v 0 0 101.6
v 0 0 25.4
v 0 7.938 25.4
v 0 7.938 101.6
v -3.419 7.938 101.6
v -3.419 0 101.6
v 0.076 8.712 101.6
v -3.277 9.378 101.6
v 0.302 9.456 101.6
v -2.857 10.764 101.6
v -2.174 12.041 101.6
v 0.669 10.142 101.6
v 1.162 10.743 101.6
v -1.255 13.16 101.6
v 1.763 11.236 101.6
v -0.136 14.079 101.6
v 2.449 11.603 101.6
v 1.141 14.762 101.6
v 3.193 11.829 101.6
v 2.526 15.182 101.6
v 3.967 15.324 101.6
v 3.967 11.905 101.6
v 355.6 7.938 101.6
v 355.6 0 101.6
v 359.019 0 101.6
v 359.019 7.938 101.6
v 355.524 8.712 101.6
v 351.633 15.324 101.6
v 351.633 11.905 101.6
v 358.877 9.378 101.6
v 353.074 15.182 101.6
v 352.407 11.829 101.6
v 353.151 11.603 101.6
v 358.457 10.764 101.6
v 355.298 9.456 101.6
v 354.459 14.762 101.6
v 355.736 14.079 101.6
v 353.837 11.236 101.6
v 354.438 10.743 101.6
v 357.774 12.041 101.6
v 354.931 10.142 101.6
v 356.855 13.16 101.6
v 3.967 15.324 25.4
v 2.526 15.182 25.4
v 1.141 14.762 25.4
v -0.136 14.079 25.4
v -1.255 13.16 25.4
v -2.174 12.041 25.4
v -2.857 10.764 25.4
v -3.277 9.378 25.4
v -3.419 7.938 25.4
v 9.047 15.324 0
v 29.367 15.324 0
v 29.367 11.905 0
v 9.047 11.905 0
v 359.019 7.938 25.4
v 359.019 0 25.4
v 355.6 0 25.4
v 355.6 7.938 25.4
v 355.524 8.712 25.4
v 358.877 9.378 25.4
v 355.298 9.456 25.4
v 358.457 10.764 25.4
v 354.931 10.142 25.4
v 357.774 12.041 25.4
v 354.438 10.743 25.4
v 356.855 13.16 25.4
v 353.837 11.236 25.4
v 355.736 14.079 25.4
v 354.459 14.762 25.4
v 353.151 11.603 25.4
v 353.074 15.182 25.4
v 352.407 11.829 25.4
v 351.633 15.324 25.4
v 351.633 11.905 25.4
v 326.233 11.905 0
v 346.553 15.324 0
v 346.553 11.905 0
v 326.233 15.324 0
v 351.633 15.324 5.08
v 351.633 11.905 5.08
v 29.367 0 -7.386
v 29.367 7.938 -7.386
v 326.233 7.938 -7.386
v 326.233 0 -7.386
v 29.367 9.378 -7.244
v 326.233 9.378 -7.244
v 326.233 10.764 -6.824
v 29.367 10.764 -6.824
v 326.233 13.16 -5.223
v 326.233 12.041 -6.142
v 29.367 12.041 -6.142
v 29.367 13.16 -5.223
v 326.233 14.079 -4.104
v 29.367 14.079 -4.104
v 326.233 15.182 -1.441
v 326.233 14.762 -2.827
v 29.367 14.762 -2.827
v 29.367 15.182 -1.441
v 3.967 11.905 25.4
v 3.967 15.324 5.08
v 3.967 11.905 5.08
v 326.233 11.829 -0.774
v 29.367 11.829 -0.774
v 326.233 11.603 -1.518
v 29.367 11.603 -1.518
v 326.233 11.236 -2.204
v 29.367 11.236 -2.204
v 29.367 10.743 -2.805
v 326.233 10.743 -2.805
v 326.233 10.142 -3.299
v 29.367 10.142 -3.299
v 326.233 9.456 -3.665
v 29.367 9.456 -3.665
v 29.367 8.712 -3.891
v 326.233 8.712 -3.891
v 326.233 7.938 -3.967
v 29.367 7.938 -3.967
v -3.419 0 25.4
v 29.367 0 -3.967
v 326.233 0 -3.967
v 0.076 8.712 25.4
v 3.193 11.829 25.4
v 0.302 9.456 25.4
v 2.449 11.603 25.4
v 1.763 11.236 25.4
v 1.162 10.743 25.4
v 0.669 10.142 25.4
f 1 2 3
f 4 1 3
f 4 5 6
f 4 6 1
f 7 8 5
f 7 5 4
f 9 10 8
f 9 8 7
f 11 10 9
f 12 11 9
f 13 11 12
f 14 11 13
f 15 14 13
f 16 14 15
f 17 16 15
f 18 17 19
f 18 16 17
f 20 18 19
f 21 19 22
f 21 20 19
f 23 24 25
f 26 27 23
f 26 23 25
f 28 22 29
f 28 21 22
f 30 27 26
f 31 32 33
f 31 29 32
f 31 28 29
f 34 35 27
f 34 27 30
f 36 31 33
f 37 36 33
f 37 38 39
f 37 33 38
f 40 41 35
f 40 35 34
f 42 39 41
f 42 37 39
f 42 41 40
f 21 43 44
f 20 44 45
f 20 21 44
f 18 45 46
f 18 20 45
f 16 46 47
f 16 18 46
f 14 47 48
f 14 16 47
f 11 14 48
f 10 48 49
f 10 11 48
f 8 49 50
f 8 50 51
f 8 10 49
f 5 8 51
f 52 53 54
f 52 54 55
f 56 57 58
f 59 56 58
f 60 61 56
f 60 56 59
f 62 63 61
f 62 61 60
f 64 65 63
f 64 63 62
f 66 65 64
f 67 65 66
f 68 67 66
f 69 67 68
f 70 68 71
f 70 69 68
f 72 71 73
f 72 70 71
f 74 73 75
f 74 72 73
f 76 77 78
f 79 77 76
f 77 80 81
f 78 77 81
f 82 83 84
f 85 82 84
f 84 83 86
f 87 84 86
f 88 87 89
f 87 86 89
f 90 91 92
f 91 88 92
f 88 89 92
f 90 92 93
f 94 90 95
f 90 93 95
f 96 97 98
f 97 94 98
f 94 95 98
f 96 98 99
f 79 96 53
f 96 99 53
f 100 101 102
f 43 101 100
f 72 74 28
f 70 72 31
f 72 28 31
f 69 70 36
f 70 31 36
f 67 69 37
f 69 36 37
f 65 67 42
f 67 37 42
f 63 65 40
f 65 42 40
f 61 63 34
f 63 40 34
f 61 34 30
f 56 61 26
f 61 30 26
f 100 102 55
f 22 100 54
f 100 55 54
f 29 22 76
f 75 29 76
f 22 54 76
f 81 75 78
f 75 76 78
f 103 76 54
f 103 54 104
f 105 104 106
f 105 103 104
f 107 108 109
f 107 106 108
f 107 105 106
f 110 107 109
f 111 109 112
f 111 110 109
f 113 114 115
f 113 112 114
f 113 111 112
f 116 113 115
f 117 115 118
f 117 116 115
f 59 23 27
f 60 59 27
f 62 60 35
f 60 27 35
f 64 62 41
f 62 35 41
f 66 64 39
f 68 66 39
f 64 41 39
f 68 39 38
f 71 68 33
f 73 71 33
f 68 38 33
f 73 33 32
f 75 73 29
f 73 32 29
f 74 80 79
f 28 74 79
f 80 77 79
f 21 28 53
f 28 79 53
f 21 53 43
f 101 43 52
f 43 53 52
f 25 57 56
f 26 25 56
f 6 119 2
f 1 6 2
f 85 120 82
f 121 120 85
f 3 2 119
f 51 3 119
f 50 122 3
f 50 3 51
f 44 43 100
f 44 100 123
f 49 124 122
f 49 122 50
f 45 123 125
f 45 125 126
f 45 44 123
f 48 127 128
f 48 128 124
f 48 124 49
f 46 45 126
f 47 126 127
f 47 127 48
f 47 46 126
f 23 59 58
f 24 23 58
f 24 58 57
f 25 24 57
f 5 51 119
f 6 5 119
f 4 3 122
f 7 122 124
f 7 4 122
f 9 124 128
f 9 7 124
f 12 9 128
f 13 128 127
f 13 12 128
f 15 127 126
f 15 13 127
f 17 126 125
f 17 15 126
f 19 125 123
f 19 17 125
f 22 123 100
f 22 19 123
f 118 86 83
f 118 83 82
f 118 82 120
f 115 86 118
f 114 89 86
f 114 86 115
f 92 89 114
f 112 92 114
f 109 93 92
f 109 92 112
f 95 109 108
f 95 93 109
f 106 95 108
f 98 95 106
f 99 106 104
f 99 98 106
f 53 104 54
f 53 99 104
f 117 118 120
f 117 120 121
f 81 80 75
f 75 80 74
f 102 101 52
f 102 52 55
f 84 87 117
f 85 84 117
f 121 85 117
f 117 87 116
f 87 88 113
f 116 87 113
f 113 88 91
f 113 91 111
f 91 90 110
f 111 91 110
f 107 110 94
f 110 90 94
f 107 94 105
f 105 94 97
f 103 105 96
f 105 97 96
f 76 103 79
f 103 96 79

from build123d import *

# Parameters (mm, degrees)
F1_DEPTH = 101.6
F2_W     = 347.66504
F2_H     = 7.38632
F3_DEPTH = 3.41884
F4_W     = 347.66504
F4_H     = 3.41884
F5_DEPTH = 11.90498
F6_R     = 3.96748
F7_R     = 7.38632
F8_W     = 7.38632
F8_H     = 25.4
F8_W_2   = 25.4
F8_H_2   = 7.38632
F9_DEPTH = 15.32382
F10_SIZE = 5.08


# Not quite as in the source:
# - a feature names something its author has since deleted; it is built from what else it names


with BuildPart() as f1:
    # F0 (on Top) → F1 (new body)
    with BuildSketch(Plane.XY):
        Polygon((-3.41884, 0), (0, 0), (0, 11.90498), (355.6, 11.90498), (355.6, 0), (359.01884, 0), (359.01884, 15.32382), (-3.41884, 15.32382), align=None)
    extrude(amount=F1_DEPTH)

    # F2 (on face) → F3 (join, through all)
    with BuildSketch(Plane(origin=(0, 15.32382, 0), x_dir=(-1, 0, 0), z_dir=(0, 1, 0))):
        with Locations((-177.8, -3.69316)):
            Rectangle(F2_W, F2_H)
    extrude(amount=-F3_DEPTH)

    # F4 (on face) → F5 (join, through all)
    with BuildSketch(Plane.XZ.offset(-11.90498)):
        with Locations((177.8, -5.6769)):
            Rectangle(F4_W, F4_H)
    extrude(amount=F5_DEPTH)

    # F6
    f6_edges = [f1.edges().sort_by_distance(p)[0] for p in [
        (0, 11.90498, 50.8),
        (355.6, 11.90498, 50.8),
        (177.8, 11.90498, -3.96748),
    ]]
    fillet(f6_edges, radius=F6_R)

    # F7
    f7_edges = [f1.edges().sort_by_distance(p)[0] for p in [
        (-3.41884, 15.32382, 50.8),
        (359.01884, 15.32382, 50.8),
        (177.8, 15.32382, -7.38632),
    ]]
    fillet(f7_edges, radius=F7_R)

    # F8 (on face) → F9 (cut, through all)
    with BuildSketch(Plane(origin=(0, 15.32382, 0), x_dir=(-1, 0, 0), z_dir=(0, 1, 0))):
        with Locations((-355.32568, 12.7)):
            Rectangle(F8_W, F8_H)
        with Locations((-338.93252, -3.69316)):
            Rectangle(F8_W_2, F8_H_2)
        with Locations((-0.27432, 12.7)):
            Rectangle(F8_W, F8_H)
        with Locations((-16.66748, -3.69316)):
            Rectangle(F8_W_2, F8_H_2)
    extrude(amount=-F9_DEPTH, mode=Mode.SUBTRACT)

    # F10
    f10_edges = [f1.edges().sort_by_distance(p)[0] for p in [
        (351.63252, 13.6144, 0),
        (3.96748, 13.6144, 0),
    ]]
    chamfer(f10_edges, length=F10_SIZE)


solid = f1.part
